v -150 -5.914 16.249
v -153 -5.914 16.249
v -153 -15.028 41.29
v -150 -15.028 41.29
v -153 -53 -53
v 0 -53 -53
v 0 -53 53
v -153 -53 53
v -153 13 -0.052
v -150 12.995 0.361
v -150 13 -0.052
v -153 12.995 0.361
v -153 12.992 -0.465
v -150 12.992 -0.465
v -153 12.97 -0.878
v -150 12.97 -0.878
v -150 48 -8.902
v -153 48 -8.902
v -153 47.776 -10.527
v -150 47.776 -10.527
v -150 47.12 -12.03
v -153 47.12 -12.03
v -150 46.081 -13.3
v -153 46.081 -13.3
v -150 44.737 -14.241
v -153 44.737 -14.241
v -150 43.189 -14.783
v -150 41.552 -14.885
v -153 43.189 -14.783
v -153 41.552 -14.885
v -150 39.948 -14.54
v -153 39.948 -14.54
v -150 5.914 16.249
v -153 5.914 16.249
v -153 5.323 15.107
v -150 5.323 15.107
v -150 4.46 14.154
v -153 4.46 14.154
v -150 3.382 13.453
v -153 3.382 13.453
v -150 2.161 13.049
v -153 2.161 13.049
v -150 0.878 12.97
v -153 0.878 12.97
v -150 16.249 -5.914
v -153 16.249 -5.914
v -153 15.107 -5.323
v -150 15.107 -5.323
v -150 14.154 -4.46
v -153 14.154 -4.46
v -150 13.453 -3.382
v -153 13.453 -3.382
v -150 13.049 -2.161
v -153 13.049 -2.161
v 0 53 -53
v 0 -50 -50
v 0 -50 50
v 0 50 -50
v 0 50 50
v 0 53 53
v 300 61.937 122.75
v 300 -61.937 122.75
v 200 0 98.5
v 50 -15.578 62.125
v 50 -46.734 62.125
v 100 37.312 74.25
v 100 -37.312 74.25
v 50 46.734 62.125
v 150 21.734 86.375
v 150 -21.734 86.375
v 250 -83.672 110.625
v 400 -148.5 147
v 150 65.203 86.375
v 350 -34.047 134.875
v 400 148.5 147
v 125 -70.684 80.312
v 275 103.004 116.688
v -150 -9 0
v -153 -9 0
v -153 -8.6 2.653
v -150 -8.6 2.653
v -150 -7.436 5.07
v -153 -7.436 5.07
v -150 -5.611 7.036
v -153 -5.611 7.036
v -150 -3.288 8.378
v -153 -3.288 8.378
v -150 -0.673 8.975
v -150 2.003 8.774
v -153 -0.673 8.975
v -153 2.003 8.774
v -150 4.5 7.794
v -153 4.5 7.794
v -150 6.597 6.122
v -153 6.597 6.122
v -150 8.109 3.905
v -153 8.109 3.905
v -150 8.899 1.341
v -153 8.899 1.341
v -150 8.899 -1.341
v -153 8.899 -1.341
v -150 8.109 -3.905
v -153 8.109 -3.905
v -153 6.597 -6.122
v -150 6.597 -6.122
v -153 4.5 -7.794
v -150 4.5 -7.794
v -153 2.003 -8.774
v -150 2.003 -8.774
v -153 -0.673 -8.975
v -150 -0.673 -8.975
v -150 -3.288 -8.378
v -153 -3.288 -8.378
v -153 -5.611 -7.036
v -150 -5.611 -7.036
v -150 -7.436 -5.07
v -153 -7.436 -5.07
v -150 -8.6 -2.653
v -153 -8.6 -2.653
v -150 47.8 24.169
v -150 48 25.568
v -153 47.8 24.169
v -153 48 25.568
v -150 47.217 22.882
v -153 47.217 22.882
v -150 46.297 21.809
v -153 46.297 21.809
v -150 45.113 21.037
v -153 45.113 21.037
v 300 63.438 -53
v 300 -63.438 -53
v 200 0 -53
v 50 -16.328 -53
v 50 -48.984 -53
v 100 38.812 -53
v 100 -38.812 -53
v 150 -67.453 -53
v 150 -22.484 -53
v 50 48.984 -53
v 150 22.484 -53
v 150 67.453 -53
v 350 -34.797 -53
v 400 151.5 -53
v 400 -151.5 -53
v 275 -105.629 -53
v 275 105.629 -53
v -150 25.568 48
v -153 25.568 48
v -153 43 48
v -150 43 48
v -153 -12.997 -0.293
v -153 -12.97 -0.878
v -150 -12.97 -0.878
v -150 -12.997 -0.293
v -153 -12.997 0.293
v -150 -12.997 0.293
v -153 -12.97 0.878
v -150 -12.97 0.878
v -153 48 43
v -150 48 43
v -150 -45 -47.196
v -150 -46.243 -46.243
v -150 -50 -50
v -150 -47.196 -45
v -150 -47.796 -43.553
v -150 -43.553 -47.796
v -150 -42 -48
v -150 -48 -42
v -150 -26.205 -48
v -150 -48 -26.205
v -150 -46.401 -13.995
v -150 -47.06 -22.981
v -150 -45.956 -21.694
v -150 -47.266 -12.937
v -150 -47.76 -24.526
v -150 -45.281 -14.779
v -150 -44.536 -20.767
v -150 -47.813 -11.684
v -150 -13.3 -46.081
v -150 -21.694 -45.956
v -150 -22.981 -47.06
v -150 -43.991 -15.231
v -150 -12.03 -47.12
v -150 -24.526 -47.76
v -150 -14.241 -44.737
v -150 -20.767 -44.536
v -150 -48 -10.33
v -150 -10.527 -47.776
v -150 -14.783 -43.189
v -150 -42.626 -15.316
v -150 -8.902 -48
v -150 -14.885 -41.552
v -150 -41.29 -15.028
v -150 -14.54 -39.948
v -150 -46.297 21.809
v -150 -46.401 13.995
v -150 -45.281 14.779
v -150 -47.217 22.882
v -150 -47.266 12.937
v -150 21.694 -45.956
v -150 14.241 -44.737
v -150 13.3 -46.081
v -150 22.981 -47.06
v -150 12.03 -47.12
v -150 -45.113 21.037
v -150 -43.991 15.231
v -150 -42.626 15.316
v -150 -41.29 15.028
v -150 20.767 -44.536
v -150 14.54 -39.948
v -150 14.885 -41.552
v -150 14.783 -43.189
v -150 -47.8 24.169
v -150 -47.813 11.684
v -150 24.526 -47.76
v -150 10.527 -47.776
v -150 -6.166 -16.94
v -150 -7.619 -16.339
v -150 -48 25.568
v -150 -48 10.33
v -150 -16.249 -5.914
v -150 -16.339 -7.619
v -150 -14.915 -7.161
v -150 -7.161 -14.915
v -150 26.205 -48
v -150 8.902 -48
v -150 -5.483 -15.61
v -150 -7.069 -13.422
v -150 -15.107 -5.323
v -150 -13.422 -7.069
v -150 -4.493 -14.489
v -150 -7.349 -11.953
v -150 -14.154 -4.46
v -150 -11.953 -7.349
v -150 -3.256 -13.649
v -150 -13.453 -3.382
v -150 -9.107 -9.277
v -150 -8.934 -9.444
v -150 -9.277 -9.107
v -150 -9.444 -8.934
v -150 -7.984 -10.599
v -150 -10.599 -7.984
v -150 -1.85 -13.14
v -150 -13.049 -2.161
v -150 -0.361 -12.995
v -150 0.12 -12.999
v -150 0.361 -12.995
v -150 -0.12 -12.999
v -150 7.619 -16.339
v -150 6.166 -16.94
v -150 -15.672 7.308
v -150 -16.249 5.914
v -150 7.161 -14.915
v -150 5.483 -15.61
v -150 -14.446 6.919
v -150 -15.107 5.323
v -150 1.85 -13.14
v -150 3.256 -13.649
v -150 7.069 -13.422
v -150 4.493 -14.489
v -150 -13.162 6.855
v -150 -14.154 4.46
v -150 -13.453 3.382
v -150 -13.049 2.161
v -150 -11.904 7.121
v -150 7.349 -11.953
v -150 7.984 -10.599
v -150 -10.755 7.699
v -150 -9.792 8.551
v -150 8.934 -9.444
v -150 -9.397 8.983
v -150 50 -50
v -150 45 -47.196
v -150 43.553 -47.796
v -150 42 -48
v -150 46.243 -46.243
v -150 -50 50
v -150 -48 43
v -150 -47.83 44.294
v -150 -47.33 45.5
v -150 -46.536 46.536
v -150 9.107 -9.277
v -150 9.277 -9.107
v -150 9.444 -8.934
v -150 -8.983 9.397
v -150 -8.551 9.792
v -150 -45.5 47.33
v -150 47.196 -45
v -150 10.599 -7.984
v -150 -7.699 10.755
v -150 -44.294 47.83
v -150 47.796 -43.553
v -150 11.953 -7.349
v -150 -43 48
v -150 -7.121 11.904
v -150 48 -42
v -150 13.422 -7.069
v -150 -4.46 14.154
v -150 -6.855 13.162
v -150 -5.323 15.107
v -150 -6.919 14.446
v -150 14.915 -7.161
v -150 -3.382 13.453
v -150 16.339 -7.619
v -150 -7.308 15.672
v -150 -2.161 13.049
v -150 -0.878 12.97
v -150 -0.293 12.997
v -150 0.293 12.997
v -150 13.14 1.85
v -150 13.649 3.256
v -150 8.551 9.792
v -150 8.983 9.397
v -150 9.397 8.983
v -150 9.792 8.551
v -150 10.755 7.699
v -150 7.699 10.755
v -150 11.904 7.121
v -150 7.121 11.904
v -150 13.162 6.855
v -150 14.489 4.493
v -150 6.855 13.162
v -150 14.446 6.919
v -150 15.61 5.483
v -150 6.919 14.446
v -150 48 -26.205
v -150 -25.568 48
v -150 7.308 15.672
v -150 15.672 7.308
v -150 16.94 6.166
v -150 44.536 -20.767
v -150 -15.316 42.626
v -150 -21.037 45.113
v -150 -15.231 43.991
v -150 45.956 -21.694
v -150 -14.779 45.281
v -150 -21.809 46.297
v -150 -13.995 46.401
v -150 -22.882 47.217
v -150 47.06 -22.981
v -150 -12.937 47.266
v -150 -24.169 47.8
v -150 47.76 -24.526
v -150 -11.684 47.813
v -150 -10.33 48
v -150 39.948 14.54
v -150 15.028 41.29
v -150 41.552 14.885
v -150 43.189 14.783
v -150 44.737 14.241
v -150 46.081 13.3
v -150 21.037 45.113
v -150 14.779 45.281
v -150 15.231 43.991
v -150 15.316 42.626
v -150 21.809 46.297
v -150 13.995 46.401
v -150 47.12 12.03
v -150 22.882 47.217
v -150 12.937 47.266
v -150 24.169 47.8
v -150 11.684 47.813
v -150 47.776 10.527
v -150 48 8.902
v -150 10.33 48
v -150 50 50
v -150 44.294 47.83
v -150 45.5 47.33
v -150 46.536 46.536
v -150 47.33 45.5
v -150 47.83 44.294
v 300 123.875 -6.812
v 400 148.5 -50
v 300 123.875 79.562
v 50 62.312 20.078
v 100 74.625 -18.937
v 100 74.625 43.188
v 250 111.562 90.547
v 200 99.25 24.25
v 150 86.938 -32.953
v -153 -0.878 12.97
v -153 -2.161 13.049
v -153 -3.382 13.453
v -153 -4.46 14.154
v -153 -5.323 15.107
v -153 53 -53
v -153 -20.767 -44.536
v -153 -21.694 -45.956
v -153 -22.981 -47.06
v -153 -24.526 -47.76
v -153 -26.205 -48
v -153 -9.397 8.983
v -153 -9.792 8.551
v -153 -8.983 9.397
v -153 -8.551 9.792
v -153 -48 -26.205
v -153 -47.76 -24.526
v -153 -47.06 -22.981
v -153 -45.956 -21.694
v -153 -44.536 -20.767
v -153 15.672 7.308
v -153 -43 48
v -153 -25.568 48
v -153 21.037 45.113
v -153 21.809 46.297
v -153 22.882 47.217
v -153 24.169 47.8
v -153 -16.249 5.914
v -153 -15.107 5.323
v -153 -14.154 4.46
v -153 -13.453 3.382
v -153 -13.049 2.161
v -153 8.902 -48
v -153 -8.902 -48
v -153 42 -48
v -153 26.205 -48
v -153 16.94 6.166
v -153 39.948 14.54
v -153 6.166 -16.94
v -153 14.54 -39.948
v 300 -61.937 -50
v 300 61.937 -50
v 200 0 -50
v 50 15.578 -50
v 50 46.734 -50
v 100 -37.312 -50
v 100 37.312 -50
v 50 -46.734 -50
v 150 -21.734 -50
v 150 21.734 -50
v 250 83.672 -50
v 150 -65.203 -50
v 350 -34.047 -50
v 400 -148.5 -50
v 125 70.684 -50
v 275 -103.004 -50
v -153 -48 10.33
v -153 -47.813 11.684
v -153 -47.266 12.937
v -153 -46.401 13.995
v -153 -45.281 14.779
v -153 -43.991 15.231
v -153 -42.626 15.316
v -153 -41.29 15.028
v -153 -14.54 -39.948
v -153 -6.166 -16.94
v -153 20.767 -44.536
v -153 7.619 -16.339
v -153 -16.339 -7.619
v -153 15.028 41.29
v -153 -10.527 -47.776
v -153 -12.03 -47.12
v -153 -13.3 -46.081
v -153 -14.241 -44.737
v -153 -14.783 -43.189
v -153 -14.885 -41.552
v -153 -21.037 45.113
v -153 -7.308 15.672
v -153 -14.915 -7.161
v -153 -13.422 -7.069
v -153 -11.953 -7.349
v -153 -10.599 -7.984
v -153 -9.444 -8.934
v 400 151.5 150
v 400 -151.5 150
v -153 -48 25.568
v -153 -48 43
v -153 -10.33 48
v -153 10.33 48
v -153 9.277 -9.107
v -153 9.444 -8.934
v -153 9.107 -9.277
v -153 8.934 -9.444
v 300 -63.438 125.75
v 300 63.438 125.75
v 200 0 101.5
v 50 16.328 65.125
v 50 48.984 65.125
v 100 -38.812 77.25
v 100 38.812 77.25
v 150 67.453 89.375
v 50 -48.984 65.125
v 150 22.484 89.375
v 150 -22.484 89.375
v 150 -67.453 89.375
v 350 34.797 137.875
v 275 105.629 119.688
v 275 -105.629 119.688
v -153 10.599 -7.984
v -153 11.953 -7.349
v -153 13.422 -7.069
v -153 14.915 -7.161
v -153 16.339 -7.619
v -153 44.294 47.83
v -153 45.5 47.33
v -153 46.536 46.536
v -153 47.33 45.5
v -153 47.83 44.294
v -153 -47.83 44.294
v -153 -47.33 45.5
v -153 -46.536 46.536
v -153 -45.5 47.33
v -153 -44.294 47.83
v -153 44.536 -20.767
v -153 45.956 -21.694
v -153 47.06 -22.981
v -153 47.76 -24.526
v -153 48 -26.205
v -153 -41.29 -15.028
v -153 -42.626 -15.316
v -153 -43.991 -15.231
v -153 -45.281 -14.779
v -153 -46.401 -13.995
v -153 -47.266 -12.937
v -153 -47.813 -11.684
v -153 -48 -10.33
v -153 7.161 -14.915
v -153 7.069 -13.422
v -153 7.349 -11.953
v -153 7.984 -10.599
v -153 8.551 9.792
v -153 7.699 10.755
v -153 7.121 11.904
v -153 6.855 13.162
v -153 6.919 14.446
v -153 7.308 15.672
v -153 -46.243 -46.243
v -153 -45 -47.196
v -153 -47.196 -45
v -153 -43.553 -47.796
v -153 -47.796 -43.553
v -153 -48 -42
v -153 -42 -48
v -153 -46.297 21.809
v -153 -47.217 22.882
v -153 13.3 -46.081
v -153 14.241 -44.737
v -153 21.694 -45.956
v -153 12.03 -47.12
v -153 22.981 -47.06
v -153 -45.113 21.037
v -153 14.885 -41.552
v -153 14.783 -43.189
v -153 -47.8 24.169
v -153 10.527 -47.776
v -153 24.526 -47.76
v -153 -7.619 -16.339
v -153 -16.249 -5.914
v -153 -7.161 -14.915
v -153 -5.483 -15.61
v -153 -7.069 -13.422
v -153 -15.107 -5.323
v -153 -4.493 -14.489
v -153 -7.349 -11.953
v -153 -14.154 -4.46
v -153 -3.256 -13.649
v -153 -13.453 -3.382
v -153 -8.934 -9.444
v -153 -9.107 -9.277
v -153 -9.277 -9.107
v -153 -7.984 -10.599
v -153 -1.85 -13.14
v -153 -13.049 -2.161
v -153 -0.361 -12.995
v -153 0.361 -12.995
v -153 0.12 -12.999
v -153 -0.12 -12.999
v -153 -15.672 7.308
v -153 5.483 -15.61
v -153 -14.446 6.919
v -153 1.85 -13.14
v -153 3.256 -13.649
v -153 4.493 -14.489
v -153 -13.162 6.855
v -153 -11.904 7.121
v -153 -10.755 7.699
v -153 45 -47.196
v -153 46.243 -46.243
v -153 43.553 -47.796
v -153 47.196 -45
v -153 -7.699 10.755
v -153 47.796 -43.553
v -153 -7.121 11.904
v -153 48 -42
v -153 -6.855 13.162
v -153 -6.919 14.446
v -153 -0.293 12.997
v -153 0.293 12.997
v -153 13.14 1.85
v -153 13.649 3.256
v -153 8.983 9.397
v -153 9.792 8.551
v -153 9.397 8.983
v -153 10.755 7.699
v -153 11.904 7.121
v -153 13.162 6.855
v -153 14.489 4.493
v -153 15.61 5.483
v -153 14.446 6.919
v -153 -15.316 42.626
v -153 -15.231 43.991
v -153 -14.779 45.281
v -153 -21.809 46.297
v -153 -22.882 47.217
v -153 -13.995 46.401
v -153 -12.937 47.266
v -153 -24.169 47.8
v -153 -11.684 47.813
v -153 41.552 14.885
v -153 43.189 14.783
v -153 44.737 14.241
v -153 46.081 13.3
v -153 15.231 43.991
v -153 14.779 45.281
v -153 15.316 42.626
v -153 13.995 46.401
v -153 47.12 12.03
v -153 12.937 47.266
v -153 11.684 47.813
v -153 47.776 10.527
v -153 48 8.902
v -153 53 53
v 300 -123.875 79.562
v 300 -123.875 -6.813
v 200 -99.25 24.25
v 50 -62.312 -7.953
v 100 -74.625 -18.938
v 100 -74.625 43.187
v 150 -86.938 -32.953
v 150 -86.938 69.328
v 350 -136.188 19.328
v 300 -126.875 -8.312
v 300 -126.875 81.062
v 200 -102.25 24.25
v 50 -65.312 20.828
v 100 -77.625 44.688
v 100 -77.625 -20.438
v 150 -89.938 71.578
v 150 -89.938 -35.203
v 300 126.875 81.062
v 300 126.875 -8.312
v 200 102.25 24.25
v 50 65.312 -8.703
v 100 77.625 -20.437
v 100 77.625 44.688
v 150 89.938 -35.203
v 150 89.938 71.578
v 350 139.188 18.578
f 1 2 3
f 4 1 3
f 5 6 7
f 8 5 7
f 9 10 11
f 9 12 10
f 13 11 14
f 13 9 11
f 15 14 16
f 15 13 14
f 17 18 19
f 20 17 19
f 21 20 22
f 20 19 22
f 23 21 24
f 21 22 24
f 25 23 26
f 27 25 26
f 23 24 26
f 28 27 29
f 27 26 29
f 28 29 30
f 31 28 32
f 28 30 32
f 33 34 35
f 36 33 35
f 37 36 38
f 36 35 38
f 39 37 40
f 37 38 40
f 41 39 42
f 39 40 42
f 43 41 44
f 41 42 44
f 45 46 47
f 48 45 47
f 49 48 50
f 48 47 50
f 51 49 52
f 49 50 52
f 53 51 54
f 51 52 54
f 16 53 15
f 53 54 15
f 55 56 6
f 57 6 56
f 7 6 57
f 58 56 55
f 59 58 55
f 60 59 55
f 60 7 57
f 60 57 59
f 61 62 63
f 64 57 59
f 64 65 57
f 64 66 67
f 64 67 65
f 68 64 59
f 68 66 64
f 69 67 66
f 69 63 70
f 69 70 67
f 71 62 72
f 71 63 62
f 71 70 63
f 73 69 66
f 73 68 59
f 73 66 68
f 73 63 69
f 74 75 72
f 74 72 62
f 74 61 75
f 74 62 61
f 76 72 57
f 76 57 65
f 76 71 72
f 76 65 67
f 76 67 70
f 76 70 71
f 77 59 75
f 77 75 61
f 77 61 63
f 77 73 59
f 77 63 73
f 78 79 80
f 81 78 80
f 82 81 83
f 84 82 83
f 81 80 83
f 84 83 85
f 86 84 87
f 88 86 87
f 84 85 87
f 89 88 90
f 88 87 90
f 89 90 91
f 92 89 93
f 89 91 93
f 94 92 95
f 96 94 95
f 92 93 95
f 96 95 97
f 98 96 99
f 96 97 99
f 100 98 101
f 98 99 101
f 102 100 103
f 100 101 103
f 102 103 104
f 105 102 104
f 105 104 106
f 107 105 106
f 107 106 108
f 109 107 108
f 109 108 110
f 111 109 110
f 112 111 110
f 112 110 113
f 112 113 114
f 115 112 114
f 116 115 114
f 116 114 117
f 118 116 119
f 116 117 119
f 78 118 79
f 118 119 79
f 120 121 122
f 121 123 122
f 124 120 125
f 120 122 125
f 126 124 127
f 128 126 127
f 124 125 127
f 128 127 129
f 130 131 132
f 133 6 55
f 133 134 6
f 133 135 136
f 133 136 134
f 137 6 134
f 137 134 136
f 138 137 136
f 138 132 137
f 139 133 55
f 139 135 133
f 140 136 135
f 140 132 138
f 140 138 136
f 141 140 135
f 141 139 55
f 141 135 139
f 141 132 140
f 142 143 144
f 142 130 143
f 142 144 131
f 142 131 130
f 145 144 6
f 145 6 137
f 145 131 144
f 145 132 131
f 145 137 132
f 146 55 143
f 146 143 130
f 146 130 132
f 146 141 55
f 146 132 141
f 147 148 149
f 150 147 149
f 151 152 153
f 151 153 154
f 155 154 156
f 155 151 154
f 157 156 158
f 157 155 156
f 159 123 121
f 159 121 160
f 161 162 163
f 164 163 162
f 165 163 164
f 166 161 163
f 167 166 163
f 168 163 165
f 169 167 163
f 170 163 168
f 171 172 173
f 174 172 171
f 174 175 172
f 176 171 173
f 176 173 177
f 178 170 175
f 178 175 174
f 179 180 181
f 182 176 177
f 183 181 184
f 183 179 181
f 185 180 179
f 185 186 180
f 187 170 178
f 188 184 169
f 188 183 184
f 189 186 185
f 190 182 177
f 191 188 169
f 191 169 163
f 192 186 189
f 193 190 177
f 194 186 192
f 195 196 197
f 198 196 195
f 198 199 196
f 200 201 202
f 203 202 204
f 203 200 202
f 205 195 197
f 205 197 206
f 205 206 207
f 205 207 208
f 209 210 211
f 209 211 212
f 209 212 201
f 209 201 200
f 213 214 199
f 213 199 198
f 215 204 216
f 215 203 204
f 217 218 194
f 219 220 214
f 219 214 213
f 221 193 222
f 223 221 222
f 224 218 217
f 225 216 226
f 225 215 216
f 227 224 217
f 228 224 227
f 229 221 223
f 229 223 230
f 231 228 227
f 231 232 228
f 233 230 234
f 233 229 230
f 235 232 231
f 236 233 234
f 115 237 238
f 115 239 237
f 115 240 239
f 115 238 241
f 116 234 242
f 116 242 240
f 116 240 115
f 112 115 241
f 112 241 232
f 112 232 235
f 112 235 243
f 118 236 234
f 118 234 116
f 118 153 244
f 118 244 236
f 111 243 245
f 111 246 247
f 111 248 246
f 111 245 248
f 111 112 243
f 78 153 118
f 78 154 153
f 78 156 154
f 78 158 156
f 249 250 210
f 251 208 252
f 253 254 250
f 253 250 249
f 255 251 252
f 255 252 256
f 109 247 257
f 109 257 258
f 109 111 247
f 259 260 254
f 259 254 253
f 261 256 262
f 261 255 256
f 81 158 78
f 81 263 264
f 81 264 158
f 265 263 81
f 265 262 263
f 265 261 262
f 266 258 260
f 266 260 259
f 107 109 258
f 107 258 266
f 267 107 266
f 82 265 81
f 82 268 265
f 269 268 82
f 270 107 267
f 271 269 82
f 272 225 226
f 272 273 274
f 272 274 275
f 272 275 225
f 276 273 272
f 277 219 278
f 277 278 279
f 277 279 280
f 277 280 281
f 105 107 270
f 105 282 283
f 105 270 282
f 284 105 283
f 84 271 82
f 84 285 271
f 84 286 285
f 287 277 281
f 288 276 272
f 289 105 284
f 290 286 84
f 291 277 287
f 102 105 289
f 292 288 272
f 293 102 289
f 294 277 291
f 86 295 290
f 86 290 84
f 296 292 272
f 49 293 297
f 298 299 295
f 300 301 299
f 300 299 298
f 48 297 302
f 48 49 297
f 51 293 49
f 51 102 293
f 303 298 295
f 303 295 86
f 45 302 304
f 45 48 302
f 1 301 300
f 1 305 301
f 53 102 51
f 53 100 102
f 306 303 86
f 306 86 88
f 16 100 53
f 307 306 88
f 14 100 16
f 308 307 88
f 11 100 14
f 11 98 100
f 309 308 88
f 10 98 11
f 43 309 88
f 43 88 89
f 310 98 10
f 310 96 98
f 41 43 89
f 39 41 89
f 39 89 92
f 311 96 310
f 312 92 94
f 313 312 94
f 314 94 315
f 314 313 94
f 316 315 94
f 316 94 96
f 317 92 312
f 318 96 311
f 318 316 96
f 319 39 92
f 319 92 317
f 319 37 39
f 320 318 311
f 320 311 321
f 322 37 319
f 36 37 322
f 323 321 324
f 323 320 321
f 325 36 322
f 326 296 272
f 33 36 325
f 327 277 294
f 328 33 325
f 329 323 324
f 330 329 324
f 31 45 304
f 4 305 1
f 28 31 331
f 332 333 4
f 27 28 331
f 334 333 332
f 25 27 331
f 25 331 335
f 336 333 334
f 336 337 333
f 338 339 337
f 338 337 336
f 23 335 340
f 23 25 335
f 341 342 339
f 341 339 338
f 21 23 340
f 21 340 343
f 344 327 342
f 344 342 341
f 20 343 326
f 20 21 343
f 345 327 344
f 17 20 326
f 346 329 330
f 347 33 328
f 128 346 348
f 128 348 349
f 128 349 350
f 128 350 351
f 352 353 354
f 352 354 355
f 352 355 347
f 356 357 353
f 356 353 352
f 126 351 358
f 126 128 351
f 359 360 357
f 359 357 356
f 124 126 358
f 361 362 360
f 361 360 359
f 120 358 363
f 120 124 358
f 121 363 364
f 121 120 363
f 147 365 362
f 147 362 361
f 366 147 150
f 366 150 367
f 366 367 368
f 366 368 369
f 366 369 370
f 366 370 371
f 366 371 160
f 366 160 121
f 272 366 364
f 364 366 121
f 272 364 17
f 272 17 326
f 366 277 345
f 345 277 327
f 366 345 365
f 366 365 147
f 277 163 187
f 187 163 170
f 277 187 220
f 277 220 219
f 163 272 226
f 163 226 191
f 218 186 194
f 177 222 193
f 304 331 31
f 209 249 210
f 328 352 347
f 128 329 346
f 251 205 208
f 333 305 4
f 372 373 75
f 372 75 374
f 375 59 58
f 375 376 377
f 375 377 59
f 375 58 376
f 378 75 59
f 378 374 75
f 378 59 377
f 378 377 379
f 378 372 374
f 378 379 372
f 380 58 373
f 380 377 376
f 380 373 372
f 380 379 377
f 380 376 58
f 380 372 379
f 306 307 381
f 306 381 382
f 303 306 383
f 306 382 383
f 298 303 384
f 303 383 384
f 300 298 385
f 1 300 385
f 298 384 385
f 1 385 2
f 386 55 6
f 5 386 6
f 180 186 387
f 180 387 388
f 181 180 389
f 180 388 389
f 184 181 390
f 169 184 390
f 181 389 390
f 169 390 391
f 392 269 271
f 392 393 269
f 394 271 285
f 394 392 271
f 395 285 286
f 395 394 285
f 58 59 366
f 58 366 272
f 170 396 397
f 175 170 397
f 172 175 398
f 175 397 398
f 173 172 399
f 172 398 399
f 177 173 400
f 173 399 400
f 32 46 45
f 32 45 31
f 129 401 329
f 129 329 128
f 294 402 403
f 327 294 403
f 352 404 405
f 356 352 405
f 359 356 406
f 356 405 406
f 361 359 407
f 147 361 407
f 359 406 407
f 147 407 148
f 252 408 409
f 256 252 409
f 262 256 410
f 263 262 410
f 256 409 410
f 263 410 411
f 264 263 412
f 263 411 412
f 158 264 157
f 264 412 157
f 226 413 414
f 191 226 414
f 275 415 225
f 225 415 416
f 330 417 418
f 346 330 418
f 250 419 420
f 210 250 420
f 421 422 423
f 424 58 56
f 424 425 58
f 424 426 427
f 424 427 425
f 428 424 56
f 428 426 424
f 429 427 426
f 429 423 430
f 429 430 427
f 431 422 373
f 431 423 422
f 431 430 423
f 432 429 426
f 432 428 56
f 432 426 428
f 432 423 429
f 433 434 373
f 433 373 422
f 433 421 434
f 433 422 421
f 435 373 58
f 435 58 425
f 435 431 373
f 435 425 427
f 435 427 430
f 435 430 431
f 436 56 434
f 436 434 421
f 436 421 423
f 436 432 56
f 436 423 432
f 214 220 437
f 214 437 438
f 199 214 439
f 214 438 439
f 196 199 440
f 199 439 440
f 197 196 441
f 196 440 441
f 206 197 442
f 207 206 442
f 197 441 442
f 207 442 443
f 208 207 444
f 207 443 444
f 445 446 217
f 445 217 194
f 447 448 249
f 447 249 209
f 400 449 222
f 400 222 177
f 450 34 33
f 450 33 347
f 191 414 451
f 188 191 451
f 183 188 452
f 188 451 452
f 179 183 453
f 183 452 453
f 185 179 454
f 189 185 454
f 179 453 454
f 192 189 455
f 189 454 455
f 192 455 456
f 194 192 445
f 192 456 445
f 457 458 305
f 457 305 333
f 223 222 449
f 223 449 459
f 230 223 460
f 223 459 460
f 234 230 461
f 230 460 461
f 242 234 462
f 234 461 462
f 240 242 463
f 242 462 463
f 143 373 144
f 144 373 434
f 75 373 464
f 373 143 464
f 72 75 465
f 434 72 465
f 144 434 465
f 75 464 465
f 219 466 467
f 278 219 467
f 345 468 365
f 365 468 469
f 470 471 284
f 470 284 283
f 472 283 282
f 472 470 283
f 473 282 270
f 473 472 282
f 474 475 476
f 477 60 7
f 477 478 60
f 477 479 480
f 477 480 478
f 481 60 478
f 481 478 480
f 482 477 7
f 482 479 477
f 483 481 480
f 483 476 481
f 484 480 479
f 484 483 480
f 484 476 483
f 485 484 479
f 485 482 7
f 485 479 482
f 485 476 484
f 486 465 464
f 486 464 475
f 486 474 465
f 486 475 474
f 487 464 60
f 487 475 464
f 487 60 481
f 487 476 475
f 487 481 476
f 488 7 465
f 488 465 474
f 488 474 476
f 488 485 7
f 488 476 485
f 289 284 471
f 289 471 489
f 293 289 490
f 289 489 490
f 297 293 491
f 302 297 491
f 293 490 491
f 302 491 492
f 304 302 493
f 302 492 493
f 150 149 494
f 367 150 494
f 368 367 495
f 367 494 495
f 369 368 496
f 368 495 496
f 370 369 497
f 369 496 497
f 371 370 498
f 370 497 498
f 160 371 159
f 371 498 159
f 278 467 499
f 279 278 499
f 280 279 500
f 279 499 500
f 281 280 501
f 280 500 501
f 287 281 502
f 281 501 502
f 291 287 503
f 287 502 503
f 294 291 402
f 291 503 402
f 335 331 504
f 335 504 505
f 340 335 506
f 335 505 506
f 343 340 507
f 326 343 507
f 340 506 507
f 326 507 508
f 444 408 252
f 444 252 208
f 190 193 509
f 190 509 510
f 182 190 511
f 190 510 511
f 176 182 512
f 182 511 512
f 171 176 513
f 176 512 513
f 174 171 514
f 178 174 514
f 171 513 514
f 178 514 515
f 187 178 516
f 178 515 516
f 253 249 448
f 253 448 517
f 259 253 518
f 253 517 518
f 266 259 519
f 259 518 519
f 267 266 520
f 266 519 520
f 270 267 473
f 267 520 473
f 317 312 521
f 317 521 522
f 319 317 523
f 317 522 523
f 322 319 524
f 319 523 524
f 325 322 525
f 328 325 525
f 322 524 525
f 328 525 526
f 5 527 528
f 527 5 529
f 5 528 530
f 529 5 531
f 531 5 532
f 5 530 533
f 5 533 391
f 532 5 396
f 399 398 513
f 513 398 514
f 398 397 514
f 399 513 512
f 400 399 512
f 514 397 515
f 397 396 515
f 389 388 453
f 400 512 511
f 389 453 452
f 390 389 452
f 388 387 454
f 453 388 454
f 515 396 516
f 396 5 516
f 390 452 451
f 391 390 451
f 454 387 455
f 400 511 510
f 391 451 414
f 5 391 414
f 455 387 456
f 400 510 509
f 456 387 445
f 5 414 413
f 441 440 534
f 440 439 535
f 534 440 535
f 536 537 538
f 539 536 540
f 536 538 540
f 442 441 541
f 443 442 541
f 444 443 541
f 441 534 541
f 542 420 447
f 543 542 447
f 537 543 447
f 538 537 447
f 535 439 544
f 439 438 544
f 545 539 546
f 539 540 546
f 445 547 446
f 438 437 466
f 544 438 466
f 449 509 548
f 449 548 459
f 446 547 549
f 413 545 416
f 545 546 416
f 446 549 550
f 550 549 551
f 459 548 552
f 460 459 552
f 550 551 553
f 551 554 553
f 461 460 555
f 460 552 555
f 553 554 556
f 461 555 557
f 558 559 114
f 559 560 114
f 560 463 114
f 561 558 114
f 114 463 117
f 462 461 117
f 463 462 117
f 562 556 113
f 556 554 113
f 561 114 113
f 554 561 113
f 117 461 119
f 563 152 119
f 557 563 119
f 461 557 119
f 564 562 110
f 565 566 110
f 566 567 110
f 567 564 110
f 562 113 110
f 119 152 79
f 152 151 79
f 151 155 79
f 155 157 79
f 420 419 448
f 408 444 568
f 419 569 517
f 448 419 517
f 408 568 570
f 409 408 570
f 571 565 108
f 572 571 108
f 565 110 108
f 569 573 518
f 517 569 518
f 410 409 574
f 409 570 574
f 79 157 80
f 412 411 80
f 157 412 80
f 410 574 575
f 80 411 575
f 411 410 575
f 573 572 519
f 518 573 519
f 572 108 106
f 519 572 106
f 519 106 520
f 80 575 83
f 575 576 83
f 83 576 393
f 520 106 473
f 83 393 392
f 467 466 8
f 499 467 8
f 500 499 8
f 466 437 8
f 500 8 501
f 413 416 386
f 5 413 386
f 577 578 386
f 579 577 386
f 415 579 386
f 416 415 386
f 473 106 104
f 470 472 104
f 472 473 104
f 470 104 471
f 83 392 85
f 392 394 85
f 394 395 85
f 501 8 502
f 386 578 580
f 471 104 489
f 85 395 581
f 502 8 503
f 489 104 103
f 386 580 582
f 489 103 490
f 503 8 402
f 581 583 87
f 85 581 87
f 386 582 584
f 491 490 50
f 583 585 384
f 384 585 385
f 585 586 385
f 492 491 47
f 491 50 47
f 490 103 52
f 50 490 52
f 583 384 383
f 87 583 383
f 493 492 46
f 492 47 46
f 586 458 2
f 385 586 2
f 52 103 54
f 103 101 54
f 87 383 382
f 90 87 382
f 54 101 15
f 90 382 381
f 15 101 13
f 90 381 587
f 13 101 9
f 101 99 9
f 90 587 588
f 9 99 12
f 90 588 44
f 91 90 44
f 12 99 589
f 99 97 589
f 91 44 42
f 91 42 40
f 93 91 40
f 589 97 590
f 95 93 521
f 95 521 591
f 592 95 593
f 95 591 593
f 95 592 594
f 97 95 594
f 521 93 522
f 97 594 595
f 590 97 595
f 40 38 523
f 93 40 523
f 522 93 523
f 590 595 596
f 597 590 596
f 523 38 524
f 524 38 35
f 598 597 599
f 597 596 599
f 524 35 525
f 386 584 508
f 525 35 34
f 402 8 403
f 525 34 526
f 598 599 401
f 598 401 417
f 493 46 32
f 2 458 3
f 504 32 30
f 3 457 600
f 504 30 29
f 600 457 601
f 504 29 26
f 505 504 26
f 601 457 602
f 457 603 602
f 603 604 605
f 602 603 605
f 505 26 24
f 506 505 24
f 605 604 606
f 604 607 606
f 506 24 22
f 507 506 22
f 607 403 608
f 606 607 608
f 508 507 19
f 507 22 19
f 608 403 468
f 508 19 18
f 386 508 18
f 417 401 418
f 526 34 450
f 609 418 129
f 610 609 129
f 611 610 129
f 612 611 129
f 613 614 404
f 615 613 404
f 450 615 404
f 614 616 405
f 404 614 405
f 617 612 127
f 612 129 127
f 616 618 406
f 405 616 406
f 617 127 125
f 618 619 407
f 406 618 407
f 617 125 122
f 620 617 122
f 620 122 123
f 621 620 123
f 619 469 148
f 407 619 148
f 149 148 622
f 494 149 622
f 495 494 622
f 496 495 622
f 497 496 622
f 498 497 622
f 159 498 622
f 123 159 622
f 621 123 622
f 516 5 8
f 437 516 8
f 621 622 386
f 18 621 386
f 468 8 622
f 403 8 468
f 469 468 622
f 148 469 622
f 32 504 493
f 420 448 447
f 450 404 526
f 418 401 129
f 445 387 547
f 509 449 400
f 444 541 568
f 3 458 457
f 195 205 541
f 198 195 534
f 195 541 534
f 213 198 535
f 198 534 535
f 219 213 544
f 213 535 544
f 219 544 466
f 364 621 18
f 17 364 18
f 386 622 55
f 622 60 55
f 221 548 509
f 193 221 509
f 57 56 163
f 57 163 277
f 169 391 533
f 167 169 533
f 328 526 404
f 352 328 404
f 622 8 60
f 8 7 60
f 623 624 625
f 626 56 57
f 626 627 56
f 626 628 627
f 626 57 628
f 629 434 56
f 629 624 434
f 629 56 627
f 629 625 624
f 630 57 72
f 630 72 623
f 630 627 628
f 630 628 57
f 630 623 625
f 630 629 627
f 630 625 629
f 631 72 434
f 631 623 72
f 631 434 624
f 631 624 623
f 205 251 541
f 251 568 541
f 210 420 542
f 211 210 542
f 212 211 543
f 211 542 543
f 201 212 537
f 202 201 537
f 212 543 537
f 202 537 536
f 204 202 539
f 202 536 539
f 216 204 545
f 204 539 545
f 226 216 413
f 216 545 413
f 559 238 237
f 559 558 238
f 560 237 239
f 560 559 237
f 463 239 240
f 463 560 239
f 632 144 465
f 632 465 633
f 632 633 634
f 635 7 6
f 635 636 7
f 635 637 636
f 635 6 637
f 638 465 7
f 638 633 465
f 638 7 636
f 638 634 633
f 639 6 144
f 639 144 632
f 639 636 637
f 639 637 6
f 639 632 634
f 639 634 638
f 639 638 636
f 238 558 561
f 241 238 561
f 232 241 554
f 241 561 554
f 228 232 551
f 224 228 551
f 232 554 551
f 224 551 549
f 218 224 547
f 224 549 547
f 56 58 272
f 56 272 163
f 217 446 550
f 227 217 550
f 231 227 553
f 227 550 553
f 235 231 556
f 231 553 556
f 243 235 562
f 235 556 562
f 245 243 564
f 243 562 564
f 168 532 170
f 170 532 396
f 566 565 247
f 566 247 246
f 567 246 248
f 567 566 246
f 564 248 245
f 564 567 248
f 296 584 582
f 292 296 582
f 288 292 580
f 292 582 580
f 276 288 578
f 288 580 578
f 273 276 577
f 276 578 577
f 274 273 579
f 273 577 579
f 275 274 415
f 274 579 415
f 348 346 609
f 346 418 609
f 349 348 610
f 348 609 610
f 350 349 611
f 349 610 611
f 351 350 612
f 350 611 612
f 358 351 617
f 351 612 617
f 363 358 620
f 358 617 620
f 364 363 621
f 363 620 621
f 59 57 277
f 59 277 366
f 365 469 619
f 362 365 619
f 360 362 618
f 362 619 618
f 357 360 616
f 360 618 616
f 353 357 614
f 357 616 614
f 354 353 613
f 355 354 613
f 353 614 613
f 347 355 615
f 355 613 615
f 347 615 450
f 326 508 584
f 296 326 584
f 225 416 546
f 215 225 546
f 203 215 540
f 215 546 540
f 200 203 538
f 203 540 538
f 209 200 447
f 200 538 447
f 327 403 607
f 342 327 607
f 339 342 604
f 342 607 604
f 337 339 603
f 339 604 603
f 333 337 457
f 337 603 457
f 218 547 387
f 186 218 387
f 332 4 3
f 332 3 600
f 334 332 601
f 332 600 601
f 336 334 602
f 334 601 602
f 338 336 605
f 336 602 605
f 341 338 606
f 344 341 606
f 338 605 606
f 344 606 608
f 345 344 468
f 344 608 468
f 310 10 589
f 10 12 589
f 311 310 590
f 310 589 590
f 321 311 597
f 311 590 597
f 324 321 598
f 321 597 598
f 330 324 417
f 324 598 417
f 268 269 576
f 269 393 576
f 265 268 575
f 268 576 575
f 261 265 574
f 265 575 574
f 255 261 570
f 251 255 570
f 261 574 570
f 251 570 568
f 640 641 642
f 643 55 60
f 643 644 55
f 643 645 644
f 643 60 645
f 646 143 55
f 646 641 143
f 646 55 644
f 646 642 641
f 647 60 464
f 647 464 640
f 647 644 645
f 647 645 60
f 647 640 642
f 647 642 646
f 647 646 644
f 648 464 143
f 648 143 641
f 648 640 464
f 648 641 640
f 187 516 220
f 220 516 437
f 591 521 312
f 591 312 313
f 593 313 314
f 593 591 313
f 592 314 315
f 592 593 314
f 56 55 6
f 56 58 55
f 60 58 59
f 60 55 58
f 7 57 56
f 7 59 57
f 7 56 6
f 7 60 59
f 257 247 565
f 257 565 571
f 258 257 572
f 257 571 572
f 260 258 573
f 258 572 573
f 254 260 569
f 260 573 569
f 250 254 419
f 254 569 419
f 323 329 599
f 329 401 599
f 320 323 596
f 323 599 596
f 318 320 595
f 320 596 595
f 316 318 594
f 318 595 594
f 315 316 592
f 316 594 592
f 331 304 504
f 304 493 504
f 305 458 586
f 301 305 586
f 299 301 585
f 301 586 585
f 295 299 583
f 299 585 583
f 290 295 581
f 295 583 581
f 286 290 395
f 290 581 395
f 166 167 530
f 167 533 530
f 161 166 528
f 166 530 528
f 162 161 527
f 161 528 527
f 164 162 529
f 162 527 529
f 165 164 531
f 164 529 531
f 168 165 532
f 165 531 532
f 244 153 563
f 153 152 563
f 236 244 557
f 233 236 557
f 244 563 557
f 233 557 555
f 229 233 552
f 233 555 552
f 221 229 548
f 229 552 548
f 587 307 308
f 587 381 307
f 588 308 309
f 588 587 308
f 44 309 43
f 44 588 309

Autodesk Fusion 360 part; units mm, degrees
sketch "Skizze7" plane through (0, 0, 0) normal (1, 0, 0) x (0, 1, 0)
  line L0 (-53, 53) -> (53, 53)
  line L1 (53, 53) -> (53, -53)
  line L2 (53, -53) -> (-53, -53)
  line L3 (-53, -53) -> (-53, 53)
  line L4 (-53, 53) -> (53, -53) construction
  line L5 (53, 53) -> (-53, -53) construction
  dimension "d31" = 106
  dimension "d32" = 106
extrude "Extrusion4" add sketch "Skizze7" against normal blind 153 makes body 1
sketch "Skizze8" plane through (0, 0, 0) normal (1, 0, 0) x (0, 1, 0)
  line L0 (50, -50) -> (-50, -50)
  line L1 (-50, -50) -> (-50, 50)
  line L2 (-50, 50) -> (50, 50)
  line L3 (50, 50) -> (50, -50)
  line L4 (50, -50) -> (-50, 50) construction
  line L5 (-50, -50) -> (50, 50) construction
  dimension "d35" = 100
  dimension "d36" = 100
extrude "Extrusion5" cut sketch "Skizze8" against normal blind 150 bodies 1
sketch "Skizze9" plane through (-153, 0, 0) normal (-1, 0, 0) x (0, -1, 0)
  line L0 (-53, -53) -> (53, -53)
  line L1 (53, -53) -> (53, 53)
  line L2 (53, 53) -> (-53, 53)
  line L3 (-53, 53) -> (-53, -53)
  line L4 (53, 53) -> (-53, 53)
  line L5 (-53, 53) -> (-53, -53)
  line L6 (-53, -53) -> (53, -53)
  line L7 (53, -53) -> (53, 53)
  circle A0 centre (0, 0) radius 9
  line L8 (-6.1659, -16.9405) -> (-14.5398, -39.9479)
  line L9 (-16.2488, -5.9141) -> (-39.9479, -14.5398)
  line L10 (-16.9405, 6.1659) -> (-39.9479, 14.5398)
  line L11 (-5.9141, 16.2488) -> (-15.0283, 41.2899)
  line L12 (5.9141, 16.2488) -> (15.0283, 41.2899)
  line L13 (16.2488, 5.9141) -> (41.2899, 15.0283)
  line L14 (16.2488, -5.9141) -> (41.2899, -15.0283)
  line L15 (6.1659, -16.9405) -> (14.5398, -39.9479)
  line L16 (-7.6189, -16.3387) -> (-20.7673, -44.5357)
  line L17 (16.3387, -7.6189) -> (44.5357, -20.7673)
  line L18 (7.6189, -16.3387) -> (20.7673, -44.5357)
  line L19 (7.3078, 15.6715) -> (21.0366, 45.1131)
  line L20 (15.6715, 7.3078) -> (45.1131, 21.0366)
  line L21 (-15.6715, 7.3078) -> (-45.1131, 21.0366)
  line L22 (-7.3078, 15.6715) -> (-21.0366, 45.1131)
  line L23 (-42, -48) -> (-26.2052, -48)
  line L24 (-48, 8.9017) -> (-48, -8.9017)
  line L25 (-48, -26.2052) -> (-48, -42)
  line L26 (-8.9017, -48) -> (8.9017, -48)
  line L27 (26.2052, -48) -> (42, -48)
  line L28 (48, -42) -> (48, -26.2052)
  line L29 (48, -10.3298) -> (48, 10.3298)
  line L30 (48, 25.5681) -> (48, 43)
  line L31 (43, 48) -> (25.5681, 48)
  line L32 (-16.3387, -7.6189) -> (-44.5357, -20.7673)
  arc A1 (8.9335, -9.4441) -> (9.4441, -8.9335) centre (0, 0) ccw
  arc A2 (12.9703, -0.8779) -> (12.9703, 0.8779) centre (0, 0) ccw
  arc A3 (9.7922, 8.5506) -> (8.5506, 9.7922) centre (0, 0) ccw
  arc A4 (0.8779, 12.9703) -> (-0.8779, 12.9703) centre (0, 0) ccw
  arc A5 (-8.5506, 9.7922) -> (-9.7922, 8.5506) centre (0, 0) ccw
  arc A6 (-12.995, 0.3611) -> (-12.9703, -0.8779) centre (0, 0) ccw
  arc A7 (-9.4441, -8.9335) -> (-8.9335, -9.4441) centre (0, 0) ccw
  arc A8 (-0.3611, -12.995) -> (0.3611, -12.995) centre (0, 0) ccw
  arc A9 (8.9335, -9.4441) -> (7.6189, -16.3387) centre (13.0567, -13.803) ccw
  arc A10 (16.3387, -7.6189) -> (9.4441, -8.9335) centre (13.803, -13.0567) ccw
  arc A11 (48, -26.2052) -> (44.5357, -20.7673) centre (42, -26.2052) ccw
  arc A12 (20.7673, -44.5357) -> (26.2052, -48) centre (26.2052, -42) ccw
  arc A13 (42, -48) -> (48, -42) centre (42, -42) ccw
  arc A14 (6.1659, -16.9405) -> (0.3611, -12.995) centre (0.5277, -18.9927) ccw
  arc A15 (-0.3611, -12.995) -> (-6.1659, -16.9405) centre (-0.5277, -18.9927) ccw
  arc A16 (-14.5398, -39.9479) -> (-8.9017, -48) centre (-8.9017, -42) ccw
  arc A17 (8.9017, -48) -> (14.5398, -39.9479) centre (8.9017, -42) ccw
  arc A18 (-7.6189, -16.3387) -> (-8.9335, -9.4441) centre (-13.0567, -13.803) ccw
  arc A19 (-9.4441, -8.9335) -> (-16.3387, -7.6189) centre (-13.803, -13.0567) ccw
  arc A20 (-44.5357, -20.7673) -> (-48, -26.2052) centre (-42, -26.2052) ccw
  arc A21 (-48, -42) -> (-42, -48) centre (-42, -42) ccw
  arc A22 (-26.2052, -48) -> (-20.7673, -44.5357) centre (-26.2052, -42) ccw
  arc A23 (-48, -8.9017) -> (-39.9479, -14.5398) centre (-42, -8.9017) ccw
  arc A24 (-39.9479, 14.5398) -> (-48, 8.9017) centre (-42, 8.9017) ccw
  arc A25 (-12.995, 0.3611) -> (-16.9405, 6.1659) centre (-18.9927, 0.5277) ccw
  line L33 (10.3298, 48) -> (-10.3298, 48)
  line L34 (-25.5681, 48) -> (-43, 48)
  line L35 (-48, 25.5681) -> (-48, 43)
  arc A26 (-16.2488, -5.9141) -> (-12.9703, -0.8779) centre (-17.9589, -1.2156) ccw
  arc A27 (-15.6715, 7.3078) -> (-9.7922, 8.5506) centre (-13.5584, 11.8393) ccw
  arc A28 (-8.5506, 9.7922) -> (-7.3078, 15.6715) centre (-11.8393, 13.5584) ccw
  arc A29 (0.8779, 12.9703) -> (5.9141, 16.2488) centre (1.2156, 17.9589) ccw
  arc A30 (-5.9141, 16.2488) -> (-0.8779, 12.9703) centre (-1.2156, 17.9589) ccw
  arc A31 (16.2488, 5.9141) -> (12.9703, 0.8779) centre (17.9589, 1.2156) ccw
  arc A32 (7.3078, 15.6715) -> (8.5506, 9.7922) centre (11.8393, 13.5584) ccw
  arc A33 (9.7922, 8.5506) -> (15.6715, 7.3078) centre (13.5584, 11.8393) ccw
  arc A34 (12.9703, -0.8779) -> (16.2488, -5.9141) centre (17.9589, -1.2156) ccw
  arc A35 (48, 10.3298) -> (41.2899, 15.0283) centre (43, 10.3298) ccw
  arc A36 (41.2899, -15.0283) -> (48, -10.3298) centre (43, -10.3298) ccw
  arc A37 (45.1131, 21.0366) -> (48, 25.5681) centre (43, 25.5681) ccw
  arc A38 (48, 43) -> (43, 48) centre (43, 43) ccw
  arc A39 (25.5681, 48) -> (21.0366, 45.1131) centre (25.5681, 43) ccw
  arc A40 (-48, 25.5681) -> (-45.1131, 21.0366) centre (-43, 25.5681) ccw
  arc A41 (-43, 48) -> (-48, 43) centre (-43, 43) ccw
  arc A42 (-21.0366, 45.1131) -> (-25.5681, 48) centre (-25.5681, 43) ccw
  arc A43 (-10.3298, 48) -> (-15.0283, 41.2899) centre (-10.3298, 43) ccw
  arc A44 (15.0283, 41.2899) -> (10.3298, 48) centre (10.3298, 43) ccw
  dimension "d39" = 106
  dimension "d40" = 106
  dimension "d41" = 18
  dimension "d52" = 6
  dimension "d53" = 6
  dimension "d54" = 5
  dimension "d55" = 5
extrude "Extrusion6" cut sketch "Skizze9" against normal blind 3 contours A0 | L8 L15 L26 A8 A14 A15 A16 A17 | L9 L10 L24 A6 A23 A24 A25 A26 | L11 L12 A4 L33 A29 A30 A43 A44 | L13 L14 L29 A2 A31 A34 A35 A36 | L16 L23 L25 L32 A7 A18 A19 A20 A21 A22 | L17 L18 L27 L28 A1 A9 A10 A11 A12 A13 | L19 L20 L30 L31 A3 A32 A33 A37 A38 A39 | L21 L22 A5 L34 L35 A27 A28 A40 A41 A42 bodies 1
sketch "Skizze11" plane through (0, 0, 0) normal (1, 0, 0) x (0, 1, 0)
  line L0 (10, -10) -> (-10, -10)
  line L1 (-10, -10) -> (-10, 10)
  line L2 (-10, 10) -> (10, 10)
  line L3 (10, 10) -> (10, -10)
  line L4 (10, -10) -> (-10, 10) construction
  line L5 (-10, -10) -> (10, 10) construction
  dimension "d59" = 20
  dimension "d60" = 20
sketch "Skizze12" plane through (400, 0, 0) normal (1, 0, 0) x (0, 1, 0)
  line L0 (10, 10) -> (-10, 10)
  line L1 (-10, 10) -> (-10, -10)
  line L2 (-10, -10) -> (10, -10)
  line L3 (10, -10) -> (10, 10)
  line L4 (151.5, 150) -> (-151.5, 150)
  line L5 (-151.5, 150) -> (-151.5, -53)
  line L6 (-151.5, -53) -> (151.5, -53)
  line L7 (151.5, -53) -> (151.5, 150)
  dimension "d63" = 303
  dimension "d64" = 203
  dimension "d74" = 150
  dimension "d75" = 151.5
sketch "Skizze13" plane through (0, 0, 0) normal (1, 0, 0) x (0, 1, 0)
  line L0 (53, 53) -> (-53, 53)
  line L1 (-53, 53) -> (-53, -53)
  line L2 (-53, -53) -> (53, -53)
  line L3 (53, -53) -> (53, 53)
  line L4 (53, 53) -> (-53, -53) construction
  line L5 (-53, 53) -> (53, -53) construction
  dimension "d65" = 106
  dimension "d66" = 106
loft "Erhebung1" add profiles "Skizze13", "Skizze12" section 1 section 2 separate body makes body 2
sketch "Skizze14" plane through (400, 0, 0) normal (1, 0, 0) x (0, 1, 0)
  line L0 (151.5, -53) -> (151.5, 150)
  line L1 (151.5, 150) -> (-151.5, 150)
  line L2 (-151.5, 150) -> (-151.5, -53)
  line L3 (-151.5, -53) -> (151.5, -53)
  line L4 (148.5, 147) -> (-148.5, 147)
  line L5 (-148.5, 147) -> (-148.5, -50)
  line L6 (-148.5, -50) -> (148.5, -50)
  line L7 (148.5, -50) -> (148.5, 147)
  dimension "d67" = 297
  dimension "d68" = 197
  dimension "d72" = 147
  dimension "d73" = 148.5
sketch "Skizze15" plane through (0, 0, 0) normal (-1, 0, 0) x (0, -1, 0)
  line L0 (-53, 53) -> (-53, -53)
  line L1 (-53, -53) -> (53, -53)
  line L2 (53, -53) -> (53, 53)
  line L3 (53, 53) -> (-53, 53)
  line L4 (-50, -50) -> (50, -50)
  line L5 (50, -50) -> (50, 50)
  line L6 (50, 50) -> (-50, 50)
  line L7 (-50, 50) -> (-50, -50)
  line L8 (-50, -50) -> (50, 50) construction
  line L9 (50, -50) -> (-50, 50) construction
  dimension "d69" = 100
  dimension "d70" = 100
loft "Erhebung2" cut profiles "Skizze15", "Skizze14" section 1 contours L4 L5 L6 L7 section 2 contours L4 L5 L6 L7 bodies 2
sketch "Skizze16" plane through (400, 0, 0) normal (1, 0, 0) x (0, 1, 0)
  line L0 (148.5, 147) -> (148.5, -50)
  line L1 (148.5, -50) -> (-148.5, -50)
  line L2 (-148.5, -50) -> (-148.5, 147)
  line L3 (-148.5, 147) -> (148.5, 147)
  line L4 (151.5, -53) -> (151.5, 150)
  line L5 (151.5, 150) -> (-151.5, 150)
  line L6 (-151.5, 150) -> (-151.5, -53)
  line L7 (-151.5, -53) -> (151.5, -53)
  line L8 (-151.5, 150) -> (151.5, 150)
  line L9 (151.5, 150) -> (151.5, -53)
  line L10 (151.5, -53) -> (-151.5, -53)
  line L11 (-151.5, -53) -> (-151.5, 150)
  line L12 (-19.7997, 75.5735) -> (-72.0363, 147)
  line L13 (0, 150) -> (0, 147)
  line L14 (-32.5699, 56.5125) -> (-148.5, 85.0322)
  line L15 (32.5699, 56.5125) -> (148.5, 85.0322)
  line L16 (19.7997, 75.5735) -> (72.0363, 147)
  line L17 (-148.5, 48.5) -> (-151.5, 48.5)
  line L18 (148.5, 48.5) -> (151.5, 48.5)
  line L19 (-32.5699, 40.4875) -> (-148.5, 11.9678)
  line L20 (-19.7997, 21.4265) -> (-72.0363, -50)
  line L21 (19.7997, 21.4265) -> (69.0401, -45.9031)
  line L22 (32.5699, 40.4875) -> (140.8889, 13.8402)
  circle A0 centre (0, 48.5) radius 20
  line L23 (45.9313, 147) -> (14.175, 78.8985)
  line L24 (-45.9313, 147) -> (-14.175, 78.8985)
  line L25 (-39.2975, -35.7738) -> (-14.175, 18.1015)
  line L26 (33.0315, 54.3243) -> (148.5, 74.6846)
  line L27 (33.0315, 42.6757) -> (136.7635, 24.3849)
  line L28 (-33.0315, 54.3243) -> (-148.5, 74.6846)
  line L29 (-33.0315, 42.6757) -> (-148.5, 22.3154)
  line L30 (-148.5, 147) -> (148.5, 147)
  line L31 (148.5, 4.1297) -> (148.5, -40)
  line L32 (138.5, -50) -> (77.1118, -50)
  line L33 (-148.5, -50) -> (-148.5, 147)
  line L34 (39.2975, -35.7738) -> (14.175, 18.1015)
  arc A1 (-21.5579, 35.8408) -> (-19.9082, 33.3783) centre (0, 48.5) ccw
  arc A2 (-19.9082, 63.6217) -> (-21.5579, 61.1592) centre (0, 48.5) ccw
  arc A3 (3.6514, 73.2319) -> (-3.6514, 73.2319) centre (0, 48.5) ccw
  arc A4 (21.5579, 61.1592) -> (19.9082, 63.6217) centre (0, 48.5) ccw
  arc A5 (-3.6514, 23.7681) -> (3.6514, 23.7681) centre (0, 48.5) ccw
  arc A6 (19.9082, 33.3783) -> (21.5579, 35.8408) centre (0, 48.5) ccw
  arc A7 (32.5699, 40.4875) -> (21.5579, 35.8408) centre (30.1811, 30.7771) ccw
  arc A8 (19.9082, 33.3783) -> (19.7997, 21.4265) centre (27.8714, 27.3297) ccw
  arc A9 (148.5, 4.1297) -> (140.8889, 13.8402) centre (138.5, 4.1297) ccw
  arc A10 (138.5, -50) -> (148.5, -40) centre (138.5, -40) ccw
  arc A11 (69.0401, -45.9031) -> (77.1118, -50) centre (77.1118, -40) ccw
  line L35 (148.5, 147) -> (148.5, 34.233)
  line L36 (-30.2344, -50) -> (30.2344, -50)
  arc A12 (30.2344, -50) -> (39.2975, -35.7738) centre (30.2344, -40) ccw
  arc A13 (-39.2975, -35.7738) -> (-30.2344, -50) centre (-30.2344, -40) ccw
  arc A14 (-3.6514, 23.7681) -> (-14.175, 18.1015) centre (-5.112, 13.8753) ccw
  arc A15 (14.175, 18.1015) -> (3.6514, 23.7681) centre (5.112, 13.8753) ccw
  arc A16 (-19.7997, 21.4265) -> (-19.9082, 33.3783) centre (-27.8714, 27.3297) ccw
  arc A17 (-21.5579, 35.8408) -> (-32.5699, 40.4875) centre (-30.1811, 30.7771) ccw
  arc A18 (-25.6132, 48.5) -> (-33.0315, 54.3243) centre (-34.7679, 44.4763) ccw
  arc A19 (-33.0315, 42.6757) -> (-25.6132, 48.5) centre (-34.7679, 52.5237) ccw
  arc A20 (-32.5699, 56.5125) -> (-21.5579, 61.1592) centre (-30.1811, 66.2229) ccw
  arc A21 (-19.9082, 63.6217) -> (-19.7997, 75.5735) centre (-27.8714, 69.6703) ccw
  arc A22 (-14.175, 78.8985) -> (-3.6514, 73.2319) centre (-5.112, 83.1247) ccw
  arc A23 (3.6514, 73.2319) -> (14.175, 78.8985) centre (5.112, 83.1247) ccw
  arc A24 (19.7997, 75.5735) -> (19.9082, 63.6217) centre (27.8714, 69.6703) ccw
  arc A25 (21.5579, 61.1592) -> (32.5699, 56.5125) centre (30.1811, 66.2229) ccw
  arc A26 (-21.5579, 35.8408) -> (-19.9082, 33.3783) centre (0, 48.5) ccw
  arc A27 (-19.9082, 63.6217) -> (-21.5579, 61.1592) centre (0, 48.5) ccw
  arc A28 (3.6514, 73.2319) -> (-3.6514, 73.2319) centre (0, 48.5) ccw
  arc A29 (33.0315, 54.3243) -> (25.6132, 48.5) centre (34.7679, 44.4763) ccw
  arc A30 (25.6132, 48.5) -> (33.0315, 42.6757) centre (34.7679, 52.5237) ccw
  arc A31 (21.5579, 61.1592) -> (19.9082, 63.6217) centre (0, 48.5) ccw
  arc A32 (19.9082, 33.3783) -> (21.5579, 35.8408) centre (0, 48.5) ccw
  arc A33 (19.9082, 33.3783) -> (21.5579, 35.8408) centre (0, 48.5) ccw
  arc A34 (-3.6514, 23.7681) -> (3.6514, 23.7681) centre (0, 48.5) ccw
  arc A35 (-21.5579, 35.8408) -> (-19.9082, 33.3783) centre (0, 48.5) ccw
  arc A36 (-19.9082, 63.6217) -> (-21.5579, 61.1592) centre (0, 48.5) ccw
  arc A37 (21.5579, 61.1592) -> (19.9082, 63.6217) centre (0, 48.5) ccw
  arc A38 (3.6514, 73.2319) -> (-3.6514, 73.2319) centre (0, 48.5) ccw
  arc A39 (136.7635, 24.3849) -> (148.5, 34.233) centre (138.5, 34.233) ccw
  dimension "d82" = 40
  dimension "d84" = 25
  dimension "d85" = 10
  dimension "d86" = 10
  dimension "d87" = 10
  dimension "d88" = 10
  dimension "d89" = 10
  dimension "d90" = 10
equation "d73 = ( 297 / 2 ) * 1 mm"
equation "d75 = ( 303 / 2 ) * 1 mm"
